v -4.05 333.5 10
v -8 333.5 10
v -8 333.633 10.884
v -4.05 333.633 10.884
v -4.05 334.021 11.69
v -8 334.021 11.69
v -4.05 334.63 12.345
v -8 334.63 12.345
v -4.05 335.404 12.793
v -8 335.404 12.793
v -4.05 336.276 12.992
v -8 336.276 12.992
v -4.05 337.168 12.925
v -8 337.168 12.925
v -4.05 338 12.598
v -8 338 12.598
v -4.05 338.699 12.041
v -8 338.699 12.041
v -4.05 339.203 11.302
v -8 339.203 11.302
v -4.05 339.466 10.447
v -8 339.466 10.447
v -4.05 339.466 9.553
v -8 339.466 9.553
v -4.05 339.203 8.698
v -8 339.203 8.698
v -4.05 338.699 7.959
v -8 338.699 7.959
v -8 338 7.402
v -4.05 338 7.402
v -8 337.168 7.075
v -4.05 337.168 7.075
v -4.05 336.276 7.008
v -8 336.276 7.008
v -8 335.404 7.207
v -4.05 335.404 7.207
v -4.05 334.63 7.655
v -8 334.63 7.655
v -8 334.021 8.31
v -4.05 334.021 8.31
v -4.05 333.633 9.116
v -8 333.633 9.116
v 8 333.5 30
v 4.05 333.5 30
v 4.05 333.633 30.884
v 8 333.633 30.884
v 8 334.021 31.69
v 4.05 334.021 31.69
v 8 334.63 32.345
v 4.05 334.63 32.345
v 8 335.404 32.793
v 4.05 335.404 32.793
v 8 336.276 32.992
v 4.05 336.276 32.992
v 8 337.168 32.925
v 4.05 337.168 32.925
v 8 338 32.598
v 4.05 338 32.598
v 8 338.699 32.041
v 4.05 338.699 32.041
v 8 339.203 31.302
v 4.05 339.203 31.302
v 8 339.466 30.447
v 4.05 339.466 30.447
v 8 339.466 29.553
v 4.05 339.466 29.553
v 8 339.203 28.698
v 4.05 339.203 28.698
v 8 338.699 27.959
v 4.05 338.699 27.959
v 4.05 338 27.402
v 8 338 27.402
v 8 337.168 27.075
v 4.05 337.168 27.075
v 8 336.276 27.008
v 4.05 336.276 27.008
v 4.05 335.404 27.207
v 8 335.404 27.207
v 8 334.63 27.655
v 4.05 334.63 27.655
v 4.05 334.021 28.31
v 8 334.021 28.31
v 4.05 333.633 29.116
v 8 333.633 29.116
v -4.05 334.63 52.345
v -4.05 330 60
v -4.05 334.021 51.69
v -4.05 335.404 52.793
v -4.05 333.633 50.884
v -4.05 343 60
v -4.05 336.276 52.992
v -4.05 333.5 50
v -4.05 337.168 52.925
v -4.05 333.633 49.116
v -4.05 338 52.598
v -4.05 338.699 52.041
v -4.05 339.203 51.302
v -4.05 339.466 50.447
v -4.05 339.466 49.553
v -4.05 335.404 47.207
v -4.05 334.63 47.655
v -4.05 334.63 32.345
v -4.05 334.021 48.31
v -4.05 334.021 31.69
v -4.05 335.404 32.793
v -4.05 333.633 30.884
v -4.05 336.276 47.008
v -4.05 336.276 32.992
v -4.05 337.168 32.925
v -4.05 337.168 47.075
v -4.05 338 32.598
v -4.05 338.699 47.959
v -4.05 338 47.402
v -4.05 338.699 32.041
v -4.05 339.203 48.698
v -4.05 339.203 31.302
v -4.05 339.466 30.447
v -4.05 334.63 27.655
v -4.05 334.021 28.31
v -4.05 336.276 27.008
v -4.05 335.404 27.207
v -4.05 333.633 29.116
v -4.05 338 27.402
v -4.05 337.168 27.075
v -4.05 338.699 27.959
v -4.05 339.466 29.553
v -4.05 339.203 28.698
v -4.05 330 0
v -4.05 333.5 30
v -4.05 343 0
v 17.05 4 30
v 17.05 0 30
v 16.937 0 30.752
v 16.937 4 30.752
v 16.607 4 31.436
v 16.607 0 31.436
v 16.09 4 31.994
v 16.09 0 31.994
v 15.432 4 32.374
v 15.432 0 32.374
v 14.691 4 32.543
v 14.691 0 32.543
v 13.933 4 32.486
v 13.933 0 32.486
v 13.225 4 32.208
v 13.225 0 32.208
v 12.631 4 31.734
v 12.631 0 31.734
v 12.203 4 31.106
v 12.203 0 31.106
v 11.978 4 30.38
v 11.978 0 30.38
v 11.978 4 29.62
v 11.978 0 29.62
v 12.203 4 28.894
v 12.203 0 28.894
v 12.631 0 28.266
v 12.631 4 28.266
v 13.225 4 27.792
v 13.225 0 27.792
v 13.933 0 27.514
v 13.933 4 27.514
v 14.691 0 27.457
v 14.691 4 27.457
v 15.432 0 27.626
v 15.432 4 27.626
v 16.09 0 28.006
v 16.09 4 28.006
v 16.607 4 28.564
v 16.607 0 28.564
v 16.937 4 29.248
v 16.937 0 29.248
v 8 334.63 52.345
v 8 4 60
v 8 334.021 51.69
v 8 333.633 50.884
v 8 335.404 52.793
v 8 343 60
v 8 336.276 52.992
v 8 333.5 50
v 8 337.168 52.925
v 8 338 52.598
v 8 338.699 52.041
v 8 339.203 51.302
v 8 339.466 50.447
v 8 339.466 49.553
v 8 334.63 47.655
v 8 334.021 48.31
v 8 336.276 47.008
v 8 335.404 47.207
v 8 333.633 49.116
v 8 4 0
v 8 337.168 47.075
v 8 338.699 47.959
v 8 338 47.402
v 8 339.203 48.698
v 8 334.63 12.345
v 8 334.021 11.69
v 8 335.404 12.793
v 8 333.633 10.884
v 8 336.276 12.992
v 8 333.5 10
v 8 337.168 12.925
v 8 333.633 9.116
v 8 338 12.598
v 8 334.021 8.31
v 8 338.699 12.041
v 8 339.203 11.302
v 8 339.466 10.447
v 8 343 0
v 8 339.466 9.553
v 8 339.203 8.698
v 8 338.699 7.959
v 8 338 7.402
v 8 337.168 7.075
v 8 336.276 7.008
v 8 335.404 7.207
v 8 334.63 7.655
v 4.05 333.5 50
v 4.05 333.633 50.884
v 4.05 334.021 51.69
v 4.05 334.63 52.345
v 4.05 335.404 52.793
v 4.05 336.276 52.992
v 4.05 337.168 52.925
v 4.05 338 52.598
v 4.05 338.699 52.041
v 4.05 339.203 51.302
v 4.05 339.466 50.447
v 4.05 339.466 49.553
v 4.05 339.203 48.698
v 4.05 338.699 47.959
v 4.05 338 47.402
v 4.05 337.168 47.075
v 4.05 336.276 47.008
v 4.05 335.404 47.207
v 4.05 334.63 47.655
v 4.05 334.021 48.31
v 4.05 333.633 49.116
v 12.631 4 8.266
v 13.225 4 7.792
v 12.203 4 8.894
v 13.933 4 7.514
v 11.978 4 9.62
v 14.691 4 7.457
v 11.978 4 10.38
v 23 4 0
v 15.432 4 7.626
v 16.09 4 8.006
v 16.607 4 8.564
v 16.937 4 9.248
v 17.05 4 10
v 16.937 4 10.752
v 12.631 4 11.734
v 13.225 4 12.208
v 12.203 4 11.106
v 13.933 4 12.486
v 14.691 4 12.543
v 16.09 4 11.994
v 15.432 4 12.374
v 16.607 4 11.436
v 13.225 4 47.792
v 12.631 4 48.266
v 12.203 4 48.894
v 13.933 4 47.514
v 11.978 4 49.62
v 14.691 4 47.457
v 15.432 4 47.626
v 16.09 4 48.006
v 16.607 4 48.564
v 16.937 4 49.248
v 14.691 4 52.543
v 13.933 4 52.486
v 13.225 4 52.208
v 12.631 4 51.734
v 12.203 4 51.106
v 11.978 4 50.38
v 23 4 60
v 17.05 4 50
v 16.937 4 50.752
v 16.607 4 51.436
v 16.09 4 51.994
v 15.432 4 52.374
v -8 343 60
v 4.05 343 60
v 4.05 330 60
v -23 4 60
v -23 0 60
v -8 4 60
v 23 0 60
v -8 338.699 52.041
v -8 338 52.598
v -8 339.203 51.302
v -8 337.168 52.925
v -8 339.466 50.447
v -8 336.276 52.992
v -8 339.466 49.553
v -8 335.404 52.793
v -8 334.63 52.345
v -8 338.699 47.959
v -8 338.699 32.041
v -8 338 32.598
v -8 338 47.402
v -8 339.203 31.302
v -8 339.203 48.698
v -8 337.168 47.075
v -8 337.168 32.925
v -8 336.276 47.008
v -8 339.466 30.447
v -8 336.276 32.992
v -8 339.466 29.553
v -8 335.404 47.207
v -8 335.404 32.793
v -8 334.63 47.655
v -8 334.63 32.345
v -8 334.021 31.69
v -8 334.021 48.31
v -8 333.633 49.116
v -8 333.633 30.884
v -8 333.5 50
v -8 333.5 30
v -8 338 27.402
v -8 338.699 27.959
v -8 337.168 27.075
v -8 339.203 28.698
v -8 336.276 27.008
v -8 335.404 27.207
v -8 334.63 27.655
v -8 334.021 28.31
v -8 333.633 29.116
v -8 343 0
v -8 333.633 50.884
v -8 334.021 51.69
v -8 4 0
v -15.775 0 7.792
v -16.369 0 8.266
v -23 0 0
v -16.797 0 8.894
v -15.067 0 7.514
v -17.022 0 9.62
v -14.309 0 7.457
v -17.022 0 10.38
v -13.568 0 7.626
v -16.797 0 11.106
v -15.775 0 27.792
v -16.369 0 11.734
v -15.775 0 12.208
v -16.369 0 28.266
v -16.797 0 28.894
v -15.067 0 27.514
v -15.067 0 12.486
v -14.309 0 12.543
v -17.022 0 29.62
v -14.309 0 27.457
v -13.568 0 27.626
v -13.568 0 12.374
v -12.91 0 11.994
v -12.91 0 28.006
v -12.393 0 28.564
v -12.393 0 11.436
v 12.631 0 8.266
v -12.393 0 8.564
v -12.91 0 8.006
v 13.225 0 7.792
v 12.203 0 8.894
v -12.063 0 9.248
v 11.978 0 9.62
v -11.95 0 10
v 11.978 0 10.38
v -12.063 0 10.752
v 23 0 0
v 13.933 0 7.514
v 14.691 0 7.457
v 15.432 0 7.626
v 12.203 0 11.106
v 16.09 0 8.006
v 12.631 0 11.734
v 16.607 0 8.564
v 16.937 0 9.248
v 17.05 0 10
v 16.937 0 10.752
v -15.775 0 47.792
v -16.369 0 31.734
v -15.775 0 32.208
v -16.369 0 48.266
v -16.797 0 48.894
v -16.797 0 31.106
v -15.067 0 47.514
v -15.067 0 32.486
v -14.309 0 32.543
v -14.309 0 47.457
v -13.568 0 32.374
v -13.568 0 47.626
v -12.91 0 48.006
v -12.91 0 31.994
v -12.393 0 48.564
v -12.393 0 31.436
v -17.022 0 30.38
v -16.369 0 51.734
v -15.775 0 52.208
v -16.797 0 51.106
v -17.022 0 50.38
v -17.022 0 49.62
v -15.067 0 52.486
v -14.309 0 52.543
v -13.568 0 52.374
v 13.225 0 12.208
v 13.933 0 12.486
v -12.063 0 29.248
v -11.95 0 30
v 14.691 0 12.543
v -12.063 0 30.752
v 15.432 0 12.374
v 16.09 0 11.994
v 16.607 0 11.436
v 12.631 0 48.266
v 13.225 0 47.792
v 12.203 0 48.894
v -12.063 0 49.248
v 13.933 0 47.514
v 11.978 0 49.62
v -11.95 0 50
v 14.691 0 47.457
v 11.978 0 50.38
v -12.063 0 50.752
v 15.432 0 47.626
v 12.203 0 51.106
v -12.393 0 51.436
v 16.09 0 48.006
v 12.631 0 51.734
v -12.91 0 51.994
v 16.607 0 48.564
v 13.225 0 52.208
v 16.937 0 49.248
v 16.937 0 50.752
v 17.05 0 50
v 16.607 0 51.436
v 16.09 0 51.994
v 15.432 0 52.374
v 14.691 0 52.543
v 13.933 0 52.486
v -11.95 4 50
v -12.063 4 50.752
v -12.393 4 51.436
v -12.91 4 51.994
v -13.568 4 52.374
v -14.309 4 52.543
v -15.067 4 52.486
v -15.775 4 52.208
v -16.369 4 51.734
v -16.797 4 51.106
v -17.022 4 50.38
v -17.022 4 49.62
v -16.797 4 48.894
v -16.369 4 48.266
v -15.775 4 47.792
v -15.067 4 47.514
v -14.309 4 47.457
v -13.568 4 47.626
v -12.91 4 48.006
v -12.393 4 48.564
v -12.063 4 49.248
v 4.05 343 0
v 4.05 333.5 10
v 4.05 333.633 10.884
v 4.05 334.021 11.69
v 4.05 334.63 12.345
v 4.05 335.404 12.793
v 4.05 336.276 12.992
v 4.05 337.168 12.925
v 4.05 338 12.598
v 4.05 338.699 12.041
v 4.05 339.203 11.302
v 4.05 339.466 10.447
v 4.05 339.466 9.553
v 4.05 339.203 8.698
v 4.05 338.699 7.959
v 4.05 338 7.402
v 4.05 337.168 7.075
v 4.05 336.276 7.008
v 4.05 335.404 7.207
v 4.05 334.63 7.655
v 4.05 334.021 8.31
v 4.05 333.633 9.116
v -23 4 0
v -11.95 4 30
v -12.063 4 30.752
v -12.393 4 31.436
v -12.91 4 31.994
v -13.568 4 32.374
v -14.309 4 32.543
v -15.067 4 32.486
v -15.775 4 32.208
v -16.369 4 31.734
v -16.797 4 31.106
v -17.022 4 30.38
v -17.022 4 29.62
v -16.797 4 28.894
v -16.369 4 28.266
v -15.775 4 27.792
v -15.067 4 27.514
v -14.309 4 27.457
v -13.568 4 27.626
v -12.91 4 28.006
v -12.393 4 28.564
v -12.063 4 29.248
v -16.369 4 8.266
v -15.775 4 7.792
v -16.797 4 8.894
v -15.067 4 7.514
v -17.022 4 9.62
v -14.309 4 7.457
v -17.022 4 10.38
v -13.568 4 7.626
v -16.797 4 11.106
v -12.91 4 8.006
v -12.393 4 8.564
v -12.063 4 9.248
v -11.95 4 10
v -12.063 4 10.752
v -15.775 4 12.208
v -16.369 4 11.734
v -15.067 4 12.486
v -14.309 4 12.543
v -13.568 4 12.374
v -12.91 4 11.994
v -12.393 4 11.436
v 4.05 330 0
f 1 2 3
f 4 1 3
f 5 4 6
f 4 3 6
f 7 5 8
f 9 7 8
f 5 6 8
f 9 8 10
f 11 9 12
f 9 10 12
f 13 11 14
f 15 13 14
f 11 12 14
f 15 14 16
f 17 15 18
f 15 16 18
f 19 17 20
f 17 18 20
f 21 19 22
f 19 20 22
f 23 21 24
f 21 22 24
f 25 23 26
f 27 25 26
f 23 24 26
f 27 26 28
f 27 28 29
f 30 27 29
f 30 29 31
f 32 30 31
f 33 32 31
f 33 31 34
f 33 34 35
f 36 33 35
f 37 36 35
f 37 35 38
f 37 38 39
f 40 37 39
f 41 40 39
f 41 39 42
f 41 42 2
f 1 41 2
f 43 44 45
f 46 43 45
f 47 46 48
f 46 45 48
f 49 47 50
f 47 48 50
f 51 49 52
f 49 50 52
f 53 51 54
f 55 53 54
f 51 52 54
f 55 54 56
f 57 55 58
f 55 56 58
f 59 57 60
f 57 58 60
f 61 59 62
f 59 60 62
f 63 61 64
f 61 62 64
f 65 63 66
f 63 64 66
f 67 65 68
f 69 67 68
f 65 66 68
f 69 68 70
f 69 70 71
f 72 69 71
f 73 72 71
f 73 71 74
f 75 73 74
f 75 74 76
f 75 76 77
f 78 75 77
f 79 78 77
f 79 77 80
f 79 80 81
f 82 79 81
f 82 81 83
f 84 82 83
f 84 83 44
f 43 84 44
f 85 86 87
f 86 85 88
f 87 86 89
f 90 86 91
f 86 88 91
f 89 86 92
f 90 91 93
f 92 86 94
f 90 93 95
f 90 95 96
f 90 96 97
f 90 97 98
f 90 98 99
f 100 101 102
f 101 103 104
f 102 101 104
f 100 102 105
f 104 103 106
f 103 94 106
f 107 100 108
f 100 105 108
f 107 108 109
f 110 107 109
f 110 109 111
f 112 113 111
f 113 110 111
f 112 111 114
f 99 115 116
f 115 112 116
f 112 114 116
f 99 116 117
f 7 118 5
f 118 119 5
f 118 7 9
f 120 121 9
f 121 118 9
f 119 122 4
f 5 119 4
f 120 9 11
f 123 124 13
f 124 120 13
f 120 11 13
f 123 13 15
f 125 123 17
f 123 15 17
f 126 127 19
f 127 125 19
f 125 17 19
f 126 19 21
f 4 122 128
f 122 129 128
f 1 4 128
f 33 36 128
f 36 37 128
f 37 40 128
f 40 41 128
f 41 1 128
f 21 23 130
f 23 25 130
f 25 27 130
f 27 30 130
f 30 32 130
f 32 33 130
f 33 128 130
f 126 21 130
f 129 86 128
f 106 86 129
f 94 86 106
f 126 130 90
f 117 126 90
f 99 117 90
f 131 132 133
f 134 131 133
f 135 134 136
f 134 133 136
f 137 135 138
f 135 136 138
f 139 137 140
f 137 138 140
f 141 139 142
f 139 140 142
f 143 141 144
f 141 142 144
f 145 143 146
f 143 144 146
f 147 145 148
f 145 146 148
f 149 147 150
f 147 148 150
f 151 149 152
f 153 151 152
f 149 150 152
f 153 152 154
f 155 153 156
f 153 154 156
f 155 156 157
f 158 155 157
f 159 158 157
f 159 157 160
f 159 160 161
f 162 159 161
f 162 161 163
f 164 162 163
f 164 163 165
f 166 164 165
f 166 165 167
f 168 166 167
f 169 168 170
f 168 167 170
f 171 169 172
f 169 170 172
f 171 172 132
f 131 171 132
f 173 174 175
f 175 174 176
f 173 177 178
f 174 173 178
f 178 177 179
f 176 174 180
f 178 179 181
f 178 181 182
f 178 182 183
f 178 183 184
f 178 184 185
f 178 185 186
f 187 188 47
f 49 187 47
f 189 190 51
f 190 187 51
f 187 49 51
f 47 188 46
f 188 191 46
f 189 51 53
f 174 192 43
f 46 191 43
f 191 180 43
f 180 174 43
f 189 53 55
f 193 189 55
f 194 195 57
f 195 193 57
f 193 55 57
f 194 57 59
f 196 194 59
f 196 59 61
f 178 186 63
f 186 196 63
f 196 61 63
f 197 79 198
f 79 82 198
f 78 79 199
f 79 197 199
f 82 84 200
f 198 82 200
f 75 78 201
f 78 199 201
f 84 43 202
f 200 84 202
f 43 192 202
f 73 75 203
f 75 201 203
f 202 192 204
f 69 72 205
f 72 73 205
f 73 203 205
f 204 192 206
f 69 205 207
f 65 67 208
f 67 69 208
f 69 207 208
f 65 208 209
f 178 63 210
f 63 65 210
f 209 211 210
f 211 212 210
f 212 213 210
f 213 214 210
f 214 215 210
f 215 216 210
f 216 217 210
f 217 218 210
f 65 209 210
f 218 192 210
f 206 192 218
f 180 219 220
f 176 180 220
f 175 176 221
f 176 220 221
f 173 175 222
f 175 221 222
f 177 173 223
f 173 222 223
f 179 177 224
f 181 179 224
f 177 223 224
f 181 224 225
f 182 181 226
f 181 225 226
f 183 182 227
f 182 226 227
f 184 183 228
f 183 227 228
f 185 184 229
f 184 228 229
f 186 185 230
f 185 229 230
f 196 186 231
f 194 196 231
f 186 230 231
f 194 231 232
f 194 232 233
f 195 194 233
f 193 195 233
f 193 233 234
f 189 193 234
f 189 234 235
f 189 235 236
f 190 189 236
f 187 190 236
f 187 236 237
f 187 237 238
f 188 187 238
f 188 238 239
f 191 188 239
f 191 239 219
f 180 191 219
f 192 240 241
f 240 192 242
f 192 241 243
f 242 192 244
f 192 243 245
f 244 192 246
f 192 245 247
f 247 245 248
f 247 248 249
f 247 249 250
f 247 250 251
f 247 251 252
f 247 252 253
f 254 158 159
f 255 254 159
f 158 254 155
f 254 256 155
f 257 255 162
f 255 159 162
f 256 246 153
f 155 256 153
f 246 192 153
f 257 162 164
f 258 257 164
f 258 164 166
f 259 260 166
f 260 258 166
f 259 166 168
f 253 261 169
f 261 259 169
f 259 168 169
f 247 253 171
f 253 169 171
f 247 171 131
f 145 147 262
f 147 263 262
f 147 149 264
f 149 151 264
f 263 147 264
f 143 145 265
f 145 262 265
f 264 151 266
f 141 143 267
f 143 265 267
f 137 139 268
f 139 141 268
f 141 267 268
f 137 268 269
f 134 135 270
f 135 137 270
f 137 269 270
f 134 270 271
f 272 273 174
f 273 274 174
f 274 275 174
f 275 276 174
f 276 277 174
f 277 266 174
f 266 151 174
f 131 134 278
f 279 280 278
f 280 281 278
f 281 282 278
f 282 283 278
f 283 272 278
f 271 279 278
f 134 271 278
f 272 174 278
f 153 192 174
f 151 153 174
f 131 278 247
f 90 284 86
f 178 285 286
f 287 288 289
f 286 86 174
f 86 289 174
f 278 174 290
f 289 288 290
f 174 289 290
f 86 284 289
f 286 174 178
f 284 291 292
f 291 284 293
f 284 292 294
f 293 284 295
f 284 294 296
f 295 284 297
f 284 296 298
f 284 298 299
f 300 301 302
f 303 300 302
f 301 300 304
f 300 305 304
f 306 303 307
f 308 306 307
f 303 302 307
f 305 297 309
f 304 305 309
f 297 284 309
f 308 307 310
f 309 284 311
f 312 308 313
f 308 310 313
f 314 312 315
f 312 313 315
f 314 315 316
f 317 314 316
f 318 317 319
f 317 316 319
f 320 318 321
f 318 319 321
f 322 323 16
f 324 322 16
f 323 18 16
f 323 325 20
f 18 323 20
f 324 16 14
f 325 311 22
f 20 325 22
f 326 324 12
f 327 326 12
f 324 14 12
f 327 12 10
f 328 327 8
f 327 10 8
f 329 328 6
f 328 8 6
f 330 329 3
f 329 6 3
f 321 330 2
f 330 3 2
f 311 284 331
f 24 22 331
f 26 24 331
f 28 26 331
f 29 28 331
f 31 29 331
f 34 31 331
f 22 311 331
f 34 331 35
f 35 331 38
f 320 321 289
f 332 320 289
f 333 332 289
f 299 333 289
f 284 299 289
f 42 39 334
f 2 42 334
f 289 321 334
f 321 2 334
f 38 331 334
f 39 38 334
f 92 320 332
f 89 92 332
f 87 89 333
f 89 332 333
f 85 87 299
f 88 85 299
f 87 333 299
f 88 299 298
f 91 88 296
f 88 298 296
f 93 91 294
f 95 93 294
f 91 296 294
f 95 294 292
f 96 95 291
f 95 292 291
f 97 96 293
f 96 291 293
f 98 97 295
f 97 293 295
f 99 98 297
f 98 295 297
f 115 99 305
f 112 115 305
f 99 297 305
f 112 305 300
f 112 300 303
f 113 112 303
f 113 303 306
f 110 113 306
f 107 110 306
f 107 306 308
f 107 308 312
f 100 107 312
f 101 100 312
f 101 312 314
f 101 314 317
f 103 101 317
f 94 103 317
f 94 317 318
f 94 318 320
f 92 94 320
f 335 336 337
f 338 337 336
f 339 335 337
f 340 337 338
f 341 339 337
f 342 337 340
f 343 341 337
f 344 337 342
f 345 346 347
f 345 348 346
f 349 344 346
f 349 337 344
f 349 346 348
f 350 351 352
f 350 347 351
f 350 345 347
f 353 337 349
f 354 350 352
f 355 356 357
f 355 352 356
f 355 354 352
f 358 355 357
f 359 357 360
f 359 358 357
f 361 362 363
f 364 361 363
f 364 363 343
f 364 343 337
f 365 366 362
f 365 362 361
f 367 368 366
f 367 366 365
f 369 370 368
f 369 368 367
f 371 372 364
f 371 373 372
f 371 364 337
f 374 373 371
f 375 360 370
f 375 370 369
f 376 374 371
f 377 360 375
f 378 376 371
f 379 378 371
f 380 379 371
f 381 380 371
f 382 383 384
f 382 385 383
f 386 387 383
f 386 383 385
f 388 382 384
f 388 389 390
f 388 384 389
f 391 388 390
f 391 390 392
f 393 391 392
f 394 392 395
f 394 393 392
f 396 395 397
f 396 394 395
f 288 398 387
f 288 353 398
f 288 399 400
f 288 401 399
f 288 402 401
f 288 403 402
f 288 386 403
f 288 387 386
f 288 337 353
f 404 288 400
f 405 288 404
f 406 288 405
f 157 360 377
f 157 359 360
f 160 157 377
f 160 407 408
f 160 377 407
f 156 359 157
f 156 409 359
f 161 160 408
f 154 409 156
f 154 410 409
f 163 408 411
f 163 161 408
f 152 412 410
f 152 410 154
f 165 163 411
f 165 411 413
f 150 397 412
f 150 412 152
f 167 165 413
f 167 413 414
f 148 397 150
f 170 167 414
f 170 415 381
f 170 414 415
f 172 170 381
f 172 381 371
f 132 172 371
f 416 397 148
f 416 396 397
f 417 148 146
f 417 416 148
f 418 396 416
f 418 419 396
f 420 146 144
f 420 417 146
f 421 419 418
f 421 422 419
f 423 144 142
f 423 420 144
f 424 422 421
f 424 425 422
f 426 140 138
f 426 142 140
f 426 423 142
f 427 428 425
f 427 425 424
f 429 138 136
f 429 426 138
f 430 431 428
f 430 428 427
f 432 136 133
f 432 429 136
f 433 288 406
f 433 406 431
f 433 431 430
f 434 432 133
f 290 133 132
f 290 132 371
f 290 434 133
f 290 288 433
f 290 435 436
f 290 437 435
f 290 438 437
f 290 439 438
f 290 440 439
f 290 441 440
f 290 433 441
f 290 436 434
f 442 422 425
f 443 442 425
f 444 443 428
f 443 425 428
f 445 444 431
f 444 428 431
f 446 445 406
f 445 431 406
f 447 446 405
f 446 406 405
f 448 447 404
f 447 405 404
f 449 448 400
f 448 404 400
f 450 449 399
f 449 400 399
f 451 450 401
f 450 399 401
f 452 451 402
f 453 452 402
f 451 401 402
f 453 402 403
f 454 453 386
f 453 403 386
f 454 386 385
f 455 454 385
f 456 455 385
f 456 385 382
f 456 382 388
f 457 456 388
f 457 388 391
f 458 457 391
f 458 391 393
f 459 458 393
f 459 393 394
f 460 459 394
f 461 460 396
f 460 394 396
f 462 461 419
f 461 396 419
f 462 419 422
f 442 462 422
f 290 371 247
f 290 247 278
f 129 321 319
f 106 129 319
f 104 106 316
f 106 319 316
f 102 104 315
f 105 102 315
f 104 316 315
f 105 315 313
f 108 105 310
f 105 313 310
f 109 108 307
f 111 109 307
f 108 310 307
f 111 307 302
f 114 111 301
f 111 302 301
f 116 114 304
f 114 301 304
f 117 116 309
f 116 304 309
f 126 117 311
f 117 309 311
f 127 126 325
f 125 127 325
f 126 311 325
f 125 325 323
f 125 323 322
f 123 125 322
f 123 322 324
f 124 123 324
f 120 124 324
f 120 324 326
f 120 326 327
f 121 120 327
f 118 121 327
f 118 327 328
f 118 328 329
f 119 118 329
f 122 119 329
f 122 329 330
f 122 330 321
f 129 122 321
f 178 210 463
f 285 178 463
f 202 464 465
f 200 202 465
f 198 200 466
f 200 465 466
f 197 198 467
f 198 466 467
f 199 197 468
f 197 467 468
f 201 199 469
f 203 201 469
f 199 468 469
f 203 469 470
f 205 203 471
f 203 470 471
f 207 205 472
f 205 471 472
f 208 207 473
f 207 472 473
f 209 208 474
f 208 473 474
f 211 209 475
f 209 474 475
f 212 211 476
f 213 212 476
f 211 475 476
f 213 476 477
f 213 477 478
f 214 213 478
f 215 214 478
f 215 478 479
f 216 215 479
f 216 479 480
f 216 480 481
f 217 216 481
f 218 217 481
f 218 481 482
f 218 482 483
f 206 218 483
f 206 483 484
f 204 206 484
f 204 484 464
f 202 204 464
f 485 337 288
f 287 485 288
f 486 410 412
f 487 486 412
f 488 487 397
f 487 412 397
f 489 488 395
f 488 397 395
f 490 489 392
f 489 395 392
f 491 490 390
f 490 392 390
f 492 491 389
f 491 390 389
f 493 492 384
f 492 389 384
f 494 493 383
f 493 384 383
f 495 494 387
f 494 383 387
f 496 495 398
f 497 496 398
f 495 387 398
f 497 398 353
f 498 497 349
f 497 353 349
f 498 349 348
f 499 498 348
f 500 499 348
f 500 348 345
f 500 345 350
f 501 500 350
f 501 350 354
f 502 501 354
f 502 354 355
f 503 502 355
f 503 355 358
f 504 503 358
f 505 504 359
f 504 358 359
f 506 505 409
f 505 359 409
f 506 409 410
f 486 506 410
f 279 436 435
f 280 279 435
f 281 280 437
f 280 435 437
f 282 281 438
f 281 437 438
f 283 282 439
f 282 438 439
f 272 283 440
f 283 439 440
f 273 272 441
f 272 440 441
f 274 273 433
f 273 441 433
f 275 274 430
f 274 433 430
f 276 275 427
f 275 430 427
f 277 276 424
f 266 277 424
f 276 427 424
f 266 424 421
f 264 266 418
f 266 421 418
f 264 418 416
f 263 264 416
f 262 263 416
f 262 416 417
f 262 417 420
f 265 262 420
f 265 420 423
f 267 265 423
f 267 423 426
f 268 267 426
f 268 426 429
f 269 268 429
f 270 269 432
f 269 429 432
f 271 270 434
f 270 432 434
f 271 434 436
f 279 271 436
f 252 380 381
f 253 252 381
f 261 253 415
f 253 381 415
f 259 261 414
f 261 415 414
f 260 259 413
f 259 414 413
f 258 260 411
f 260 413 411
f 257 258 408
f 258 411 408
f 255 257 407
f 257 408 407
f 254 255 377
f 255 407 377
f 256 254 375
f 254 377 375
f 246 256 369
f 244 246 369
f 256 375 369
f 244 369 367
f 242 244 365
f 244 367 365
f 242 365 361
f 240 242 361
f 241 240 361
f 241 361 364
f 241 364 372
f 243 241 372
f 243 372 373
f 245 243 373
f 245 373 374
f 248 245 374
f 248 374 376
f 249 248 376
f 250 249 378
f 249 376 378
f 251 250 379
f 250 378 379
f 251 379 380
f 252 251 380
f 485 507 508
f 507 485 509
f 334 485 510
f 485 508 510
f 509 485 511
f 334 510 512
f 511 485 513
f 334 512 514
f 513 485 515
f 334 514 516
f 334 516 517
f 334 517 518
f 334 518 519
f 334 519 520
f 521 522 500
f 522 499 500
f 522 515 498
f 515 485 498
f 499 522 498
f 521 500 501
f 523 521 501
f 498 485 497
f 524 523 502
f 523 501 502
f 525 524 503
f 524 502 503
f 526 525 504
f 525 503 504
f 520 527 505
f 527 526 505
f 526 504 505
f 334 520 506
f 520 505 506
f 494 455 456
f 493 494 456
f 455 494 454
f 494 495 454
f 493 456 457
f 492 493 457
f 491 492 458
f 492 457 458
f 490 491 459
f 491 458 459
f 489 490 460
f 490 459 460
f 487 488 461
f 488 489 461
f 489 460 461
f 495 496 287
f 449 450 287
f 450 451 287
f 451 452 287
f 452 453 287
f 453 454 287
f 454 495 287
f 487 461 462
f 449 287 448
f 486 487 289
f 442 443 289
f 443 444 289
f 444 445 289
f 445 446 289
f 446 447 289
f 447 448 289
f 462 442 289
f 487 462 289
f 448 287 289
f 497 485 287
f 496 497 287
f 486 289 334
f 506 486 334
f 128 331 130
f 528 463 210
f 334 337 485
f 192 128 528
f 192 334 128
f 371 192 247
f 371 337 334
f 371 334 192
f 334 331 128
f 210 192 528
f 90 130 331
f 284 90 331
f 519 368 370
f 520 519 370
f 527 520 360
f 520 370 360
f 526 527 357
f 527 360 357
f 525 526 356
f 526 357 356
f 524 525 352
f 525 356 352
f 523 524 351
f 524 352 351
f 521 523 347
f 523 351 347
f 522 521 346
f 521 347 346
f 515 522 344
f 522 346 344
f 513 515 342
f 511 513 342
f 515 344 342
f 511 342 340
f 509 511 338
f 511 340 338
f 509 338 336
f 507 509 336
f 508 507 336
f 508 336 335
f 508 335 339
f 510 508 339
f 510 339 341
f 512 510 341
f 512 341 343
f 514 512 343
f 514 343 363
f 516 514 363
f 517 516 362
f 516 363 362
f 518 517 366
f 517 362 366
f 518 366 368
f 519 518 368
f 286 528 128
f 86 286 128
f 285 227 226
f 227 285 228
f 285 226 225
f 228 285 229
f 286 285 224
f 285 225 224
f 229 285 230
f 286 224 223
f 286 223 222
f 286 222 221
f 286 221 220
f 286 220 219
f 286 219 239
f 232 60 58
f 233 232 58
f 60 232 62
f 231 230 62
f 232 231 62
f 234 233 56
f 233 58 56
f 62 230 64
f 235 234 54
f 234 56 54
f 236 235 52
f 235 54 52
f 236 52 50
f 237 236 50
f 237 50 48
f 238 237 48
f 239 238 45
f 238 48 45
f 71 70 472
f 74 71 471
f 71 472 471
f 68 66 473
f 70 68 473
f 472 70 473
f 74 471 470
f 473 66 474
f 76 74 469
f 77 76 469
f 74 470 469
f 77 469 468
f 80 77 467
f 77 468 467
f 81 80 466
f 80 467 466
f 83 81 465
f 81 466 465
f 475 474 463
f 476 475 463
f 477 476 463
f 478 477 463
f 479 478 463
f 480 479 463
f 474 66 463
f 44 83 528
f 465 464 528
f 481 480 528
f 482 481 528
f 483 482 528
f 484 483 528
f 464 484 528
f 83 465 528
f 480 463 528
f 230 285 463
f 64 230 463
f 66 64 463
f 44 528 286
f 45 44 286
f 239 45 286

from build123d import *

# Parameters (mm, degrees)
PAD_DEPTH    = 60
SKETCH001_W  = 46
SKETCH001_H  = 60
SKETCH001_R  = 2.55
PAD001_DEPTH = 4
SKETCH002_R  = 3
HOLE_DEPTH   = 31.001


with BuildPart() as part:
    # Sketch → Pad (new body)
    with BuildSketch(Plane.XY):
        Polygon((-8, 0), (8, 0), (8, 343), (4.05, 343), (4.05, 330), (-4.05, 330), (-4.05, 343), (-8, 343), align=None)
    extrude(amount=PAD_DEPTH)

    # Sketch001 (on Face3 of Pad) → Pad001 (join)
    with BuildSketch(Plane.XZ):
        with Locations((0, 30)):
            Rectangle(SKETCH001_W, SKETCH001_H)
        with Locations((-14.5, 10)):
            Circle(SKETCH001_R, mode=Mode.SUBTRACT)
        with Locations((-14.5, 50)):
            Circle(SKETCH001_R, mode=Mode.SUBTRACT)
        with Locations((-14.5, 30)):
            Circle(SKETCH001_R, mode=Mode.SUBTRACT)
        with Locations((14.5, 50)):
            Circle(SKETCH001_R, mode=Mode.SUBTRACT)
        with Locations((14.5, 30)):
            Circle(SKETCH001_R, mode=Mode.SUBTRACT)
        with Locations((14.5, 10)):
            Circle(SKETCH001_R, mode=Mode.SUBTRACT)
    extrude(amount=-PAD001_DEPTH)

    # Sketch002 (on Face3 of Pad001) → Hole (cut, through all)
    with BuildSketch(Plane(origin=(-8, 0, 0), x_dir=(0, -1, 0), z_dir=(-1, 0, 0))):
        with Locations((-336.5, 50)):
            Circle(SKETCH002_R)
        with Locations((-336.5, 10)):
            Circle(SKETCH002_R)
        with Locations((-336.5, 30)):
            Circle(SKETCH002_R)
    extrude(amount=-HOLE_DEPTH, mode=Mode.SUBTRACT)


solid = part.part
